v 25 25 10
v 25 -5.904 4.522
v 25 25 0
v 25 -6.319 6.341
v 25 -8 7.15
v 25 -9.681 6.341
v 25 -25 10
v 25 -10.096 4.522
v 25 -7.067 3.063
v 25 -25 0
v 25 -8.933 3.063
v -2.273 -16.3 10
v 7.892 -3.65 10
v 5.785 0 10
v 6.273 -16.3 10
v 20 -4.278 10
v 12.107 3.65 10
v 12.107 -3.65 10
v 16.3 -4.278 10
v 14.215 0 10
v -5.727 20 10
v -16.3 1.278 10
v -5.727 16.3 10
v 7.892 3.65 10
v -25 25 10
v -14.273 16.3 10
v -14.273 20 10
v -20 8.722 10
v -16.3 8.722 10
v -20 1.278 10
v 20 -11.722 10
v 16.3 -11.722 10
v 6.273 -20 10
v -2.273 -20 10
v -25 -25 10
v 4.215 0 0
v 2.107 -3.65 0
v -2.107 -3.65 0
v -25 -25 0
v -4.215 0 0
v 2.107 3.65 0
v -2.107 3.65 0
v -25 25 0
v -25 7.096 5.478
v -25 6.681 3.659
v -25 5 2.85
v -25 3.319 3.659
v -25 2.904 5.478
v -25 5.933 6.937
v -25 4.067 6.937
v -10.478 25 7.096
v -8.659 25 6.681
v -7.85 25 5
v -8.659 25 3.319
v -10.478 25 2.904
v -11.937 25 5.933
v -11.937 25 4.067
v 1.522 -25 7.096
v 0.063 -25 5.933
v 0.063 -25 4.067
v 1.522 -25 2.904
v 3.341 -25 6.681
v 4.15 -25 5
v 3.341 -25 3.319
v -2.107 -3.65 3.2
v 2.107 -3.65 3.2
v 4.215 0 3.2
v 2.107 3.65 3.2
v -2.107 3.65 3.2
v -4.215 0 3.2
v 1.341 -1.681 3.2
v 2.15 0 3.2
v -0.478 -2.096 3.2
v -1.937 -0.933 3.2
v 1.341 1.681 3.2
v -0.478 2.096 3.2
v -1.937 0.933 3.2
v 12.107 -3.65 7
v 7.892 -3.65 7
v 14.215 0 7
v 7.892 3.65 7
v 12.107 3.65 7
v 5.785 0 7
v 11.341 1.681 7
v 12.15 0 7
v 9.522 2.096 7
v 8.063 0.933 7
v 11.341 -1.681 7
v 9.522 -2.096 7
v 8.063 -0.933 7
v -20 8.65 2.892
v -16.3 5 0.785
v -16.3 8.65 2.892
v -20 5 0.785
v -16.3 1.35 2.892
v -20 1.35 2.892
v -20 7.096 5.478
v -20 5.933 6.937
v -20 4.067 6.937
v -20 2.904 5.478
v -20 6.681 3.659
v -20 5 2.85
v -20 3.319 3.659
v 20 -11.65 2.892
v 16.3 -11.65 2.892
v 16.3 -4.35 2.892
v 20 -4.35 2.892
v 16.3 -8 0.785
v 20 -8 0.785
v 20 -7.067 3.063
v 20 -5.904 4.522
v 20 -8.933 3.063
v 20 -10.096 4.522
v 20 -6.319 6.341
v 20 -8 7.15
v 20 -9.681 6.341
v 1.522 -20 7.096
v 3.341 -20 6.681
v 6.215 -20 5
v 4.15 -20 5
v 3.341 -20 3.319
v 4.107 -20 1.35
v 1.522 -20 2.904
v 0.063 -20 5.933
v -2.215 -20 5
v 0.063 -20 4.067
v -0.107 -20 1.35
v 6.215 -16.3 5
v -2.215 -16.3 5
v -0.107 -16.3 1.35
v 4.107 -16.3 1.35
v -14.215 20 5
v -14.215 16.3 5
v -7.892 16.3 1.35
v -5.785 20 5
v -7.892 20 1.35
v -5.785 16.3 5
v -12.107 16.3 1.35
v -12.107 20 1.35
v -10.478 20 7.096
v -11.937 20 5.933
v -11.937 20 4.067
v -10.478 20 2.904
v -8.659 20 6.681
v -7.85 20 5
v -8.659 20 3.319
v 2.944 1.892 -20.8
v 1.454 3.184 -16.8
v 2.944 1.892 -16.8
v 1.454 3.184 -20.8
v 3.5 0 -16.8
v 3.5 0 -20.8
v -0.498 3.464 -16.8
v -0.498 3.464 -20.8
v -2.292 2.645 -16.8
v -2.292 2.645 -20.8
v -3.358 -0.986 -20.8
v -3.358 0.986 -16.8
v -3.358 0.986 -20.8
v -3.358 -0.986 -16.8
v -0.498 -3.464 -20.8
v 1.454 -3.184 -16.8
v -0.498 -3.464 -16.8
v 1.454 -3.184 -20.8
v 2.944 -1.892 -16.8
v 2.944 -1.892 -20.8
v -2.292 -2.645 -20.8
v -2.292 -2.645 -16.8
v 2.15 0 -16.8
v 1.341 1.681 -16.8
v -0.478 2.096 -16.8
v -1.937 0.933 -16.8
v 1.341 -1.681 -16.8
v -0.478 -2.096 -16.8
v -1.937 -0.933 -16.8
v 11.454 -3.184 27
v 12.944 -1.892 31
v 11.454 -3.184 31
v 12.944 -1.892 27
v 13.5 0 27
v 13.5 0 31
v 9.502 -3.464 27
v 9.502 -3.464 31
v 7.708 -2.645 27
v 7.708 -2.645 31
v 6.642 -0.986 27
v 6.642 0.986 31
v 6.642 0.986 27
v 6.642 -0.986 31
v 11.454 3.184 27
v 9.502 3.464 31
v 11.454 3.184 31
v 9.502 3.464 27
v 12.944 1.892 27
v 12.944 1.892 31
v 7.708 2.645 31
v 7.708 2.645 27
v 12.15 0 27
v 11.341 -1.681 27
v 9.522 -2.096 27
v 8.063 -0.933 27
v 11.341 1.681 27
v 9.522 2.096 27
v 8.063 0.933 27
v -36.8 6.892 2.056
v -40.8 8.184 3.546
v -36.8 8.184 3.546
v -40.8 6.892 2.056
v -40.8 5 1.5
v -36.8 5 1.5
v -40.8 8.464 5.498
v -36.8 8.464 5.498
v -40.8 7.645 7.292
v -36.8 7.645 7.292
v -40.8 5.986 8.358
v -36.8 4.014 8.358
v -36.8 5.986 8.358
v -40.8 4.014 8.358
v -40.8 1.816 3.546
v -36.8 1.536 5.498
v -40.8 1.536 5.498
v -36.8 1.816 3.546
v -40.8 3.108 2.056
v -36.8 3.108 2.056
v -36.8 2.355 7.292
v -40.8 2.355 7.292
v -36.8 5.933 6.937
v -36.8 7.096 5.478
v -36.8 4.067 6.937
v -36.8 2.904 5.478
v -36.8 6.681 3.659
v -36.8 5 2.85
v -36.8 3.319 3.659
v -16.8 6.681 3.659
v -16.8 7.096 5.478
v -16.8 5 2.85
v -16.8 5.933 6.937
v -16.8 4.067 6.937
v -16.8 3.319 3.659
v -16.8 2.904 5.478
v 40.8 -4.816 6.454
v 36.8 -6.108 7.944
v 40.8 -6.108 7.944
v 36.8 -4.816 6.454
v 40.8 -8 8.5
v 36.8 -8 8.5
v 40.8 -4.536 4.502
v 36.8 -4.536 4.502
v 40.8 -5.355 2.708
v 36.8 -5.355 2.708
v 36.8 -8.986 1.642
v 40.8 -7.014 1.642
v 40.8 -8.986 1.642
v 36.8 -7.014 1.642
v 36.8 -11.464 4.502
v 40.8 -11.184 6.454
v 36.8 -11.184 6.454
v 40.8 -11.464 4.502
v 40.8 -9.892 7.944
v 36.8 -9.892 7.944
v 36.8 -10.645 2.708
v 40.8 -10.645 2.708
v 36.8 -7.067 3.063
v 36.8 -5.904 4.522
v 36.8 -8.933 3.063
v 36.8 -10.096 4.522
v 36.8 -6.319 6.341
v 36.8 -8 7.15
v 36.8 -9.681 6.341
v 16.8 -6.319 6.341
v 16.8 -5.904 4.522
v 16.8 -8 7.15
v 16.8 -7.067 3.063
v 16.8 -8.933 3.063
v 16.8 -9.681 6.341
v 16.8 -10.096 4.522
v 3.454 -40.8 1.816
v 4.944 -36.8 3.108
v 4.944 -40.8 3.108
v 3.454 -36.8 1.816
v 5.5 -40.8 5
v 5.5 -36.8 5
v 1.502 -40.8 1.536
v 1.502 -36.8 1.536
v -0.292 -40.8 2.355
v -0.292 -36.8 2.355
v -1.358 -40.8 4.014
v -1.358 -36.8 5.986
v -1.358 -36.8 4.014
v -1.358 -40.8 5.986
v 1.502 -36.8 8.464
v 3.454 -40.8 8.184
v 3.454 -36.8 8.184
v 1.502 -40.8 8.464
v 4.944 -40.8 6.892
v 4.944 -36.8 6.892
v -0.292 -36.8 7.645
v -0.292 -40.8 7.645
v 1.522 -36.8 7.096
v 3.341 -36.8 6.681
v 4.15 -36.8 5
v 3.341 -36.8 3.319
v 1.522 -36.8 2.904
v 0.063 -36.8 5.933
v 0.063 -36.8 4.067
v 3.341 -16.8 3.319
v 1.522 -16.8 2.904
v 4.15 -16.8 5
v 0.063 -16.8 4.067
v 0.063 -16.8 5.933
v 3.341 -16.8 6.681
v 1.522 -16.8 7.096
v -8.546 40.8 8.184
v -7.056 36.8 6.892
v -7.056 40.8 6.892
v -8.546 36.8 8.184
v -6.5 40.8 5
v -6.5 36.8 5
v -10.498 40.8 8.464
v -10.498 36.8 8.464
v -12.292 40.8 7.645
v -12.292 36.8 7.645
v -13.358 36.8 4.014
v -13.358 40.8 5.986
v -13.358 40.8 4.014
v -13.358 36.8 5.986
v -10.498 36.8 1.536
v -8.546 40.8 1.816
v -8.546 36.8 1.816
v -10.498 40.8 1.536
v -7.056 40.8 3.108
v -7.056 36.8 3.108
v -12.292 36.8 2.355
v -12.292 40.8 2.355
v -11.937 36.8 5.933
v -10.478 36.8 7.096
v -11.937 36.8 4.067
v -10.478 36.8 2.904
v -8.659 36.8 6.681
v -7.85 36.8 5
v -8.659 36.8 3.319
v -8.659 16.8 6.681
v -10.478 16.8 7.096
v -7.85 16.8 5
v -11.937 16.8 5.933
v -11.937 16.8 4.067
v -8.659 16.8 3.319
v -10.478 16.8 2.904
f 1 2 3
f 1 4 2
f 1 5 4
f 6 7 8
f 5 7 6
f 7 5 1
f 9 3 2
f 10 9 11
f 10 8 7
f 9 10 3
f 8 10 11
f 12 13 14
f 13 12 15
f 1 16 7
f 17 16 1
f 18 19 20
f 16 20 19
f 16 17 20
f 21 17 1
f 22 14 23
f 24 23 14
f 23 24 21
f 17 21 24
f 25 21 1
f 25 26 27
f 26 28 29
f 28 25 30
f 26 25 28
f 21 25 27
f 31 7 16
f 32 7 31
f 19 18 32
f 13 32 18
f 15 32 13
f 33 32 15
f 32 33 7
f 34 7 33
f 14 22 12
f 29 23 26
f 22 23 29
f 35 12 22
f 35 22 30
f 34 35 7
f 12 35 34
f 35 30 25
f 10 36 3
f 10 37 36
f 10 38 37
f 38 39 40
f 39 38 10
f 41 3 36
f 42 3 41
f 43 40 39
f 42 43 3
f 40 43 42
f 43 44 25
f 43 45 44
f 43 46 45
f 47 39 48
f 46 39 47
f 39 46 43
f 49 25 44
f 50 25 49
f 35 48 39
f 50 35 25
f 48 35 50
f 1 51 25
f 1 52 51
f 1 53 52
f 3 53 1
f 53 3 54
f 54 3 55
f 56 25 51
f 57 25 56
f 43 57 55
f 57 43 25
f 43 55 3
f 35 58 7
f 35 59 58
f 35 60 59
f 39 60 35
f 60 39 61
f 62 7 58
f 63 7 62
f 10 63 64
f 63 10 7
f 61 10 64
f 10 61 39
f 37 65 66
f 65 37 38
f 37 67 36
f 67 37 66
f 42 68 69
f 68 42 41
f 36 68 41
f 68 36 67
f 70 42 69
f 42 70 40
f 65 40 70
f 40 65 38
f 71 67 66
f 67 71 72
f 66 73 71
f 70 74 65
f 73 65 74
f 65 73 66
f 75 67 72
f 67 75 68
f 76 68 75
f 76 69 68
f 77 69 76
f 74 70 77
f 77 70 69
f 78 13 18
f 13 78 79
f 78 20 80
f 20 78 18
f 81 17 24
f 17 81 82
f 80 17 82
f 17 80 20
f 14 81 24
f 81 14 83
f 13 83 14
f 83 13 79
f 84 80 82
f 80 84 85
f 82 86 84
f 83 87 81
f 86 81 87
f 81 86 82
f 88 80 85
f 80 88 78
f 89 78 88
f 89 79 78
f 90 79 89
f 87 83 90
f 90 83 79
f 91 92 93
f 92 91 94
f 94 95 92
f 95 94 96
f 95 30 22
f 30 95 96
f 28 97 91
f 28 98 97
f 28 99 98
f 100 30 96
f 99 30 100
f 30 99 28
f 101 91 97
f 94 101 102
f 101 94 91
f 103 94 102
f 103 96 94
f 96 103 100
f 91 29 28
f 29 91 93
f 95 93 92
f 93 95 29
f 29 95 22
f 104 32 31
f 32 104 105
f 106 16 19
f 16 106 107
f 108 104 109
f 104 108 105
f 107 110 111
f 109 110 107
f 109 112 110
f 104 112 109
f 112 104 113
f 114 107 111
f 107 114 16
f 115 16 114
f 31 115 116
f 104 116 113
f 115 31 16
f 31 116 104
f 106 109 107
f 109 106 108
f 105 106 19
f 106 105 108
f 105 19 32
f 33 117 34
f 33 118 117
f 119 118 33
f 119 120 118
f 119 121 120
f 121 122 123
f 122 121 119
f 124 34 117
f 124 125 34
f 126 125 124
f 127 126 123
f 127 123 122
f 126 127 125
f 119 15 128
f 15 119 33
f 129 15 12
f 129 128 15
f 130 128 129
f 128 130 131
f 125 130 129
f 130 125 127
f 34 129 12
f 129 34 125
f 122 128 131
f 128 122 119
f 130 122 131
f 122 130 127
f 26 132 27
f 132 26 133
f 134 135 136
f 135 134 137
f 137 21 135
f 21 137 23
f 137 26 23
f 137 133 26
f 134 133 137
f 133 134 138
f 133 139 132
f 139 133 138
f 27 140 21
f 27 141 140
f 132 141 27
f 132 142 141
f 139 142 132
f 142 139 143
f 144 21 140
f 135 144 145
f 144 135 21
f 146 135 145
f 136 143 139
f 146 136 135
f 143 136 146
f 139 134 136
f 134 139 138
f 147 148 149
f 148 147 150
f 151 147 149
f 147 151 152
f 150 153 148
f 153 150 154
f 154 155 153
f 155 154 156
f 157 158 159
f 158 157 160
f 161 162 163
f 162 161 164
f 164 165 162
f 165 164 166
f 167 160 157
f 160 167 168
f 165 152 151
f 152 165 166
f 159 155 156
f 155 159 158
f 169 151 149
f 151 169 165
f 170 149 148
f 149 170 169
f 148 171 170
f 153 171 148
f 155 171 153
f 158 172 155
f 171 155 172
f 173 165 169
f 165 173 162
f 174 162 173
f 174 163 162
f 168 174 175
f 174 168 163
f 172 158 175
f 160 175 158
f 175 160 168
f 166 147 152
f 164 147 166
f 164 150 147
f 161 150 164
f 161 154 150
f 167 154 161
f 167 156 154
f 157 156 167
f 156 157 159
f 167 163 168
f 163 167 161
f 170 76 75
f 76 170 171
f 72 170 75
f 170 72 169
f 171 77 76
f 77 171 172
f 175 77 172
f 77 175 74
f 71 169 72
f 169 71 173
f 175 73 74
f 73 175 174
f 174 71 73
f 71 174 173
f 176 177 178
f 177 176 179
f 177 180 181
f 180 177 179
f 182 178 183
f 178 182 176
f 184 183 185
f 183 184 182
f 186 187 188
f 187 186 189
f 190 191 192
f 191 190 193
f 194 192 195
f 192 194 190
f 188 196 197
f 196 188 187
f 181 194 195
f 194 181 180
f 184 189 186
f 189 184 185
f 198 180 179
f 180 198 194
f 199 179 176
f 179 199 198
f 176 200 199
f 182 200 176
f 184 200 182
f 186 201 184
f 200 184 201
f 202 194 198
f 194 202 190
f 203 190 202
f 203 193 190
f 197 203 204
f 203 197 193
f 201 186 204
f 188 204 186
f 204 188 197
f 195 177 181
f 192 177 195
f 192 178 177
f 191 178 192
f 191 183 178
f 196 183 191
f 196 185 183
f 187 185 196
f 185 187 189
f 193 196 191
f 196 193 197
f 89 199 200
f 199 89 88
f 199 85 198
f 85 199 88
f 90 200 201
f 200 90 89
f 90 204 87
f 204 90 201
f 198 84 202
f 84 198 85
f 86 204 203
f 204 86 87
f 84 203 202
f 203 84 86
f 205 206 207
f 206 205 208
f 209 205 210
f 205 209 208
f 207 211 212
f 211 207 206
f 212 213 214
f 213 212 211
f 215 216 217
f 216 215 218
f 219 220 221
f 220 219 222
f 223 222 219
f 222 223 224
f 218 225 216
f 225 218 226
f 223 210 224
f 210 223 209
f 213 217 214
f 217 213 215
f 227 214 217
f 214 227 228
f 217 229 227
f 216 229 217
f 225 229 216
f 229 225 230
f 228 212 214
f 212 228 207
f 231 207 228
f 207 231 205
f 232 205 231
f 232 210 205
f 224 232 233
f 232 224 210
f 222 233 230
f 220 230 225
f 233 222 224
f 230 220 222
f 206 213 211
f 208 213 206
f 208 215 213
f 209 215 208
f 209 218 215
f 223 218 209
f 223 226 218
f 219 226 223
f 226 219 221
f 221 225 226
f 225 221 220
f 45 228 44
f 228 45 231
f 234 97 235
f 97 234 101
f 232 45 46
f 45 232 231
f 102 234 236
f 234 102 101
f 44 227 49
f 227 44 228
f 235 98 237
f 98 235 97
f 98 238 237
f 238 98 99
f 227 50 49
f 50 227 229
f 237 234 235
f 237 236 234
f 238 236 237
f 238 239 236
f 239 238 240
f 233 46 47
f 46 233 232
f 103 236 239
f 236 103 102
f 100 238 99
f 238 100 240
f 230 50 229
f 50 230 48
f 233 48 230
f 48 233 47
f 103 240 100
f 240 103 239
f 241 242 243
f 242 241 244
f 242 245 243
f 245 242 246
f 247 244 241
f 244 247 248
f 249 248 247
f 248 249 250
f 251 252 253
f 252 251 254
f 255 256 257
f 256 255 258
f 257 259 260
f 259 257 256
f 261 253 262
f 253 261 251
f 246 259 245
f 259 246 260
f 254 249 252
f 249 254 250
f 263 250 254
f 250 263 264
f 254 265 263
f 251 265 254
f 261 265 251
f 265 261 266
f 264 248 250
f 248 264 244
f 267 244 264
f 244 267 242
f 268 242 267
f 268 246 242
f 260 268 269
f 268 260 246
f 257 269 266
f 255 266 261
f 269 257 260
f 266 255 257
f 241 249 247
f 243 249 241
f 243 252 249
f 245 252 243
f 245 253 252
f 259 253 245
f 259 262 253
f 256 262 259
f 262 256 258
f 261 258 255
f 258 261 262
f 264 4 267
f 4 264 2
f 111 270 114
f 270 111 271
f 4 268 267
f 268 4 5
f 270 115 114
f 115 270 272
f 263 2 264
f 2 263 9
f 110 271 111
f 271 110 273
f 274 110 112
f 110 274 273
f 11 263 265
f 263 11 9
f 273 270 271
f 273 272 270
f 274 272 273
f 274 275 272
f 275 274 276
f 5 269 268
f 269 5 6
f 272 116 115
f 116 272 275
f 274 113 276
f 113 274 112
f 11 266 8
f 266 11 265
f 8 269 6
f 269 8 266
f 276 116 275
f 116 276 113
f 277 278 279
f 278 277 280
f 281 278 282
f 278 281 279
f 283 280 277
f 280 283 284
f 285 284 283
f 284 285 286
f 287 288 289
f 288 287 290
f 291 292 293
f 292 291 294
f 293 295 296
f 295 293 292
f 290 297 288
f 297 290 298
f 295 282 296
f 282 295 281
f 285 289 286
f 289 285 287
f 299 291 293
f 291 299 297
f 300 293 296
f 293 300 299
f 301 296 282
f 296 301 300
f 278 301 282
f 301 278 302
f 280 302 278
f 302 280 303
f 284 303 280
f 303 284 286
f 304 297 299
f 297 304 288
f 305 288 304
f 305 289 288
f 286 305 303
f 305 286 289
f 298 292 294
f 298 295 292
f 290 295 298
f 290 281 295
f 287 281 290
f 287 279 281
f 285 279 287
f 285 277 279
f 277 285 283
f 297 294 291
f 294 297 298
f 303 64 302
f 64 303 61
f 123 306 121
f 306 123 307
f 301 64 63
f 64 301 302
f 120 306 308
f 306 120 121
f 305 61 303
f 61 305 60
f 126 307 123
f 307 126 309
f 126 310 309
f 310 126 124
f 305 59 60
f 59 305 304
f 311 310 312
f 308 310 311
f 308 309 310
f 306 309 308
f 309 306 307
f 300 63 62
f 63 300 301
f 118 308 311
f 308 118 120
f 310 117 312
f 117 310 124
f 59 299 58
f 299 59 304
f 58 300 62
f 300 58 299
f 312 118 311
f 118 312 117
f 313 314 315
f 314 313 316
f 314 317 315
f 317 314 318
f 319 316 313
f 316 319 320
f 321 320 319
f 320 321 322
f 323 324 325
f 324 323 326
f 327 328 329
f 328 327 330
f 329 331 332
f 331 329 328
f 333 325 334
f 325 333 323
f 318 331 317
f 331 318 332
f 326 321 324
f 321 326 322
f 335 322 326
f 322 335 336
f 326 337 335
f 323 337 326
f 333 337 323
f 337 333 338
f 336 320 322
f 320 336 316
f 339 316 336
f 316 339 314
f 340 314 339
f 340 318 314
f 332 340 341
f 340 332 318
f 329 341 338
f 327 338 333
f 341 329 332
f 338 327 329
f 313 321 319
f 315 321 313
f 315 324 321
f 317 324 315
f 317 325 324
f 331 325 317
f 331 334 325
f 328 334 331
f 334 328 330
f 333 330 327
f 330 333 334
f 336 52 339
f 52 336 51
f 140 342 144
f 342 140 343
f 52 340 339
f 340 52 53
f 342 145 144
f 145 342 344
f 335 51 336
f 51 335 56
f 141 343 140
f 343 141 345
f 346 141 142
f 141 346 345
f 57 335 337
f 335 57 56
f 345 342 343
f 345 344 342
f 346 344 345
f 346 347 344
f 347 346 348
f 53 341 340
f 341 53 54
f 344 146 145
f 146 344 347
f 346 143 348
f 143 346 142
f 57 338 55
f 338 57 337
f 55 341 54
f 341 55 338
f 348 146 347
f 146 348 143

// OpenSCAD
union(){difference(){difference(){difference(){difference(){difference(){difference(){translate(v = [-25.000, -25.000])
cube(size = [50, 50, 10]);
color("Gainsboro"){cylinder(h = 3.200, r = 4.215, $fn = 6);
}
}
translate(v = [10, 0, 7])
color("Gainsboro"){cylinder(h = 3.200, r = 4.215, $fn = 6);
}
}
translate(v = [-20, 5, 5])
rotate(a = [0, 90, 0])
hull(){color("Gainsboro"){cylinder(h = 3.700, r = 4.215, $fn = 6);
}
translate(v = [-15, 0])
color("Gainsboro"){cylinder(h = 3.700, r = 4.388, $fn = 6);
}
}
}
translate(v = [20, -8, 5])
rotate(a = [0, -90, 0])
hull(){color("Gainsboro"){cylinder(h = 3.700, r = 4.215, $fn = 6);
}
translate(v = [15, 0])
color("Gainsboro"){cylinder(h = 3.700, r = 4.388, $fn = 6);
}
}
}
translate(v = [2, -20, 5])
rotate(a = [-90, 0, 0])
hull(){color("Gainsboro"){cylinder(h = 3.700, r = 4.215, $fn = 6);
}
translate(v = [0, -15])
color("Gainsboro"){cylinder(h = 3.700, r = 4.388, $fn = 6);
}
}
}
translate(v = [-10, 20, 5])
rotate(a = [90, 0, 0])
hull(){color("Gainsboro"){cylinder(h = 3.700, r = 4.215, $fn = 6);
}
translate(v = [0, 15])
color("Gainsboro"){cylinder(h = 3.700, r = 4.388, $fn = 6);
}
}
}
translate(v = [0, 0, -16.800])
union(){color("Gainsboro"){translate(v = [0, 0, -4])
cylinder(h = 4, r = 3.500);
}
color("DarkGray"){cylinder(h = 20, r = 2.150);
}
}
translate(v = [10, 0, 7])
translate(v = [0, 0, 20])
rotate(a = [180, 0])
union(){color("Gainsboro"){translate(v = [0, 0, -4])
cylinder(h = 4, r = 3.500);
}
color("DarkGray"){cylinder(h = 20, r = 2.150);
}
}
translate(v = [-20, 5, 5])
rotate(a = [0, 90, 0])
translate(v = [0, 0, -16.800])
union(){color("Gainsboro"){translate(v = [0, 0, -4])
cylinder(h = 4, r = 3.500);
}
color("DarkGray"){cylinder(h = 20, r = 2.150);
}
}
translate(v = [20, -8, 5])
rotate(a = [0, -90, 0])
translate(v = [0, 0, -16.800])
union(){color("Gainsboro"){translate(v = [0, 0, -4])
cylinder(h = 4, r = 3.500);
}
color("DarkGray"){cylinder(h = 20, r = 2.150);
}
}
translate(v = [2, -20, 5])
rotate(a = [-90, 0, 0])
translate(v = [0, 0, -16.800])
union(){color("Gainsboro"){translate(v = [0, 0, -4])
cylinder(h = 4, r = 3.500);
}
color("DarkGray"){cylinder(h = 20, r = 2.150);
}
}
translate(v = [-10, 20, 5])
rotate(a = [90, 0, 0])
translate(v = [0, 0, -16.800])
union(){color("Gainsboro"){translate(v = [0, 0, -4])
cylinder(h = 4, r = 3.500);
}
color("DarkGray"){cylinder(h = 20, r = 2.150);
}
}
}
